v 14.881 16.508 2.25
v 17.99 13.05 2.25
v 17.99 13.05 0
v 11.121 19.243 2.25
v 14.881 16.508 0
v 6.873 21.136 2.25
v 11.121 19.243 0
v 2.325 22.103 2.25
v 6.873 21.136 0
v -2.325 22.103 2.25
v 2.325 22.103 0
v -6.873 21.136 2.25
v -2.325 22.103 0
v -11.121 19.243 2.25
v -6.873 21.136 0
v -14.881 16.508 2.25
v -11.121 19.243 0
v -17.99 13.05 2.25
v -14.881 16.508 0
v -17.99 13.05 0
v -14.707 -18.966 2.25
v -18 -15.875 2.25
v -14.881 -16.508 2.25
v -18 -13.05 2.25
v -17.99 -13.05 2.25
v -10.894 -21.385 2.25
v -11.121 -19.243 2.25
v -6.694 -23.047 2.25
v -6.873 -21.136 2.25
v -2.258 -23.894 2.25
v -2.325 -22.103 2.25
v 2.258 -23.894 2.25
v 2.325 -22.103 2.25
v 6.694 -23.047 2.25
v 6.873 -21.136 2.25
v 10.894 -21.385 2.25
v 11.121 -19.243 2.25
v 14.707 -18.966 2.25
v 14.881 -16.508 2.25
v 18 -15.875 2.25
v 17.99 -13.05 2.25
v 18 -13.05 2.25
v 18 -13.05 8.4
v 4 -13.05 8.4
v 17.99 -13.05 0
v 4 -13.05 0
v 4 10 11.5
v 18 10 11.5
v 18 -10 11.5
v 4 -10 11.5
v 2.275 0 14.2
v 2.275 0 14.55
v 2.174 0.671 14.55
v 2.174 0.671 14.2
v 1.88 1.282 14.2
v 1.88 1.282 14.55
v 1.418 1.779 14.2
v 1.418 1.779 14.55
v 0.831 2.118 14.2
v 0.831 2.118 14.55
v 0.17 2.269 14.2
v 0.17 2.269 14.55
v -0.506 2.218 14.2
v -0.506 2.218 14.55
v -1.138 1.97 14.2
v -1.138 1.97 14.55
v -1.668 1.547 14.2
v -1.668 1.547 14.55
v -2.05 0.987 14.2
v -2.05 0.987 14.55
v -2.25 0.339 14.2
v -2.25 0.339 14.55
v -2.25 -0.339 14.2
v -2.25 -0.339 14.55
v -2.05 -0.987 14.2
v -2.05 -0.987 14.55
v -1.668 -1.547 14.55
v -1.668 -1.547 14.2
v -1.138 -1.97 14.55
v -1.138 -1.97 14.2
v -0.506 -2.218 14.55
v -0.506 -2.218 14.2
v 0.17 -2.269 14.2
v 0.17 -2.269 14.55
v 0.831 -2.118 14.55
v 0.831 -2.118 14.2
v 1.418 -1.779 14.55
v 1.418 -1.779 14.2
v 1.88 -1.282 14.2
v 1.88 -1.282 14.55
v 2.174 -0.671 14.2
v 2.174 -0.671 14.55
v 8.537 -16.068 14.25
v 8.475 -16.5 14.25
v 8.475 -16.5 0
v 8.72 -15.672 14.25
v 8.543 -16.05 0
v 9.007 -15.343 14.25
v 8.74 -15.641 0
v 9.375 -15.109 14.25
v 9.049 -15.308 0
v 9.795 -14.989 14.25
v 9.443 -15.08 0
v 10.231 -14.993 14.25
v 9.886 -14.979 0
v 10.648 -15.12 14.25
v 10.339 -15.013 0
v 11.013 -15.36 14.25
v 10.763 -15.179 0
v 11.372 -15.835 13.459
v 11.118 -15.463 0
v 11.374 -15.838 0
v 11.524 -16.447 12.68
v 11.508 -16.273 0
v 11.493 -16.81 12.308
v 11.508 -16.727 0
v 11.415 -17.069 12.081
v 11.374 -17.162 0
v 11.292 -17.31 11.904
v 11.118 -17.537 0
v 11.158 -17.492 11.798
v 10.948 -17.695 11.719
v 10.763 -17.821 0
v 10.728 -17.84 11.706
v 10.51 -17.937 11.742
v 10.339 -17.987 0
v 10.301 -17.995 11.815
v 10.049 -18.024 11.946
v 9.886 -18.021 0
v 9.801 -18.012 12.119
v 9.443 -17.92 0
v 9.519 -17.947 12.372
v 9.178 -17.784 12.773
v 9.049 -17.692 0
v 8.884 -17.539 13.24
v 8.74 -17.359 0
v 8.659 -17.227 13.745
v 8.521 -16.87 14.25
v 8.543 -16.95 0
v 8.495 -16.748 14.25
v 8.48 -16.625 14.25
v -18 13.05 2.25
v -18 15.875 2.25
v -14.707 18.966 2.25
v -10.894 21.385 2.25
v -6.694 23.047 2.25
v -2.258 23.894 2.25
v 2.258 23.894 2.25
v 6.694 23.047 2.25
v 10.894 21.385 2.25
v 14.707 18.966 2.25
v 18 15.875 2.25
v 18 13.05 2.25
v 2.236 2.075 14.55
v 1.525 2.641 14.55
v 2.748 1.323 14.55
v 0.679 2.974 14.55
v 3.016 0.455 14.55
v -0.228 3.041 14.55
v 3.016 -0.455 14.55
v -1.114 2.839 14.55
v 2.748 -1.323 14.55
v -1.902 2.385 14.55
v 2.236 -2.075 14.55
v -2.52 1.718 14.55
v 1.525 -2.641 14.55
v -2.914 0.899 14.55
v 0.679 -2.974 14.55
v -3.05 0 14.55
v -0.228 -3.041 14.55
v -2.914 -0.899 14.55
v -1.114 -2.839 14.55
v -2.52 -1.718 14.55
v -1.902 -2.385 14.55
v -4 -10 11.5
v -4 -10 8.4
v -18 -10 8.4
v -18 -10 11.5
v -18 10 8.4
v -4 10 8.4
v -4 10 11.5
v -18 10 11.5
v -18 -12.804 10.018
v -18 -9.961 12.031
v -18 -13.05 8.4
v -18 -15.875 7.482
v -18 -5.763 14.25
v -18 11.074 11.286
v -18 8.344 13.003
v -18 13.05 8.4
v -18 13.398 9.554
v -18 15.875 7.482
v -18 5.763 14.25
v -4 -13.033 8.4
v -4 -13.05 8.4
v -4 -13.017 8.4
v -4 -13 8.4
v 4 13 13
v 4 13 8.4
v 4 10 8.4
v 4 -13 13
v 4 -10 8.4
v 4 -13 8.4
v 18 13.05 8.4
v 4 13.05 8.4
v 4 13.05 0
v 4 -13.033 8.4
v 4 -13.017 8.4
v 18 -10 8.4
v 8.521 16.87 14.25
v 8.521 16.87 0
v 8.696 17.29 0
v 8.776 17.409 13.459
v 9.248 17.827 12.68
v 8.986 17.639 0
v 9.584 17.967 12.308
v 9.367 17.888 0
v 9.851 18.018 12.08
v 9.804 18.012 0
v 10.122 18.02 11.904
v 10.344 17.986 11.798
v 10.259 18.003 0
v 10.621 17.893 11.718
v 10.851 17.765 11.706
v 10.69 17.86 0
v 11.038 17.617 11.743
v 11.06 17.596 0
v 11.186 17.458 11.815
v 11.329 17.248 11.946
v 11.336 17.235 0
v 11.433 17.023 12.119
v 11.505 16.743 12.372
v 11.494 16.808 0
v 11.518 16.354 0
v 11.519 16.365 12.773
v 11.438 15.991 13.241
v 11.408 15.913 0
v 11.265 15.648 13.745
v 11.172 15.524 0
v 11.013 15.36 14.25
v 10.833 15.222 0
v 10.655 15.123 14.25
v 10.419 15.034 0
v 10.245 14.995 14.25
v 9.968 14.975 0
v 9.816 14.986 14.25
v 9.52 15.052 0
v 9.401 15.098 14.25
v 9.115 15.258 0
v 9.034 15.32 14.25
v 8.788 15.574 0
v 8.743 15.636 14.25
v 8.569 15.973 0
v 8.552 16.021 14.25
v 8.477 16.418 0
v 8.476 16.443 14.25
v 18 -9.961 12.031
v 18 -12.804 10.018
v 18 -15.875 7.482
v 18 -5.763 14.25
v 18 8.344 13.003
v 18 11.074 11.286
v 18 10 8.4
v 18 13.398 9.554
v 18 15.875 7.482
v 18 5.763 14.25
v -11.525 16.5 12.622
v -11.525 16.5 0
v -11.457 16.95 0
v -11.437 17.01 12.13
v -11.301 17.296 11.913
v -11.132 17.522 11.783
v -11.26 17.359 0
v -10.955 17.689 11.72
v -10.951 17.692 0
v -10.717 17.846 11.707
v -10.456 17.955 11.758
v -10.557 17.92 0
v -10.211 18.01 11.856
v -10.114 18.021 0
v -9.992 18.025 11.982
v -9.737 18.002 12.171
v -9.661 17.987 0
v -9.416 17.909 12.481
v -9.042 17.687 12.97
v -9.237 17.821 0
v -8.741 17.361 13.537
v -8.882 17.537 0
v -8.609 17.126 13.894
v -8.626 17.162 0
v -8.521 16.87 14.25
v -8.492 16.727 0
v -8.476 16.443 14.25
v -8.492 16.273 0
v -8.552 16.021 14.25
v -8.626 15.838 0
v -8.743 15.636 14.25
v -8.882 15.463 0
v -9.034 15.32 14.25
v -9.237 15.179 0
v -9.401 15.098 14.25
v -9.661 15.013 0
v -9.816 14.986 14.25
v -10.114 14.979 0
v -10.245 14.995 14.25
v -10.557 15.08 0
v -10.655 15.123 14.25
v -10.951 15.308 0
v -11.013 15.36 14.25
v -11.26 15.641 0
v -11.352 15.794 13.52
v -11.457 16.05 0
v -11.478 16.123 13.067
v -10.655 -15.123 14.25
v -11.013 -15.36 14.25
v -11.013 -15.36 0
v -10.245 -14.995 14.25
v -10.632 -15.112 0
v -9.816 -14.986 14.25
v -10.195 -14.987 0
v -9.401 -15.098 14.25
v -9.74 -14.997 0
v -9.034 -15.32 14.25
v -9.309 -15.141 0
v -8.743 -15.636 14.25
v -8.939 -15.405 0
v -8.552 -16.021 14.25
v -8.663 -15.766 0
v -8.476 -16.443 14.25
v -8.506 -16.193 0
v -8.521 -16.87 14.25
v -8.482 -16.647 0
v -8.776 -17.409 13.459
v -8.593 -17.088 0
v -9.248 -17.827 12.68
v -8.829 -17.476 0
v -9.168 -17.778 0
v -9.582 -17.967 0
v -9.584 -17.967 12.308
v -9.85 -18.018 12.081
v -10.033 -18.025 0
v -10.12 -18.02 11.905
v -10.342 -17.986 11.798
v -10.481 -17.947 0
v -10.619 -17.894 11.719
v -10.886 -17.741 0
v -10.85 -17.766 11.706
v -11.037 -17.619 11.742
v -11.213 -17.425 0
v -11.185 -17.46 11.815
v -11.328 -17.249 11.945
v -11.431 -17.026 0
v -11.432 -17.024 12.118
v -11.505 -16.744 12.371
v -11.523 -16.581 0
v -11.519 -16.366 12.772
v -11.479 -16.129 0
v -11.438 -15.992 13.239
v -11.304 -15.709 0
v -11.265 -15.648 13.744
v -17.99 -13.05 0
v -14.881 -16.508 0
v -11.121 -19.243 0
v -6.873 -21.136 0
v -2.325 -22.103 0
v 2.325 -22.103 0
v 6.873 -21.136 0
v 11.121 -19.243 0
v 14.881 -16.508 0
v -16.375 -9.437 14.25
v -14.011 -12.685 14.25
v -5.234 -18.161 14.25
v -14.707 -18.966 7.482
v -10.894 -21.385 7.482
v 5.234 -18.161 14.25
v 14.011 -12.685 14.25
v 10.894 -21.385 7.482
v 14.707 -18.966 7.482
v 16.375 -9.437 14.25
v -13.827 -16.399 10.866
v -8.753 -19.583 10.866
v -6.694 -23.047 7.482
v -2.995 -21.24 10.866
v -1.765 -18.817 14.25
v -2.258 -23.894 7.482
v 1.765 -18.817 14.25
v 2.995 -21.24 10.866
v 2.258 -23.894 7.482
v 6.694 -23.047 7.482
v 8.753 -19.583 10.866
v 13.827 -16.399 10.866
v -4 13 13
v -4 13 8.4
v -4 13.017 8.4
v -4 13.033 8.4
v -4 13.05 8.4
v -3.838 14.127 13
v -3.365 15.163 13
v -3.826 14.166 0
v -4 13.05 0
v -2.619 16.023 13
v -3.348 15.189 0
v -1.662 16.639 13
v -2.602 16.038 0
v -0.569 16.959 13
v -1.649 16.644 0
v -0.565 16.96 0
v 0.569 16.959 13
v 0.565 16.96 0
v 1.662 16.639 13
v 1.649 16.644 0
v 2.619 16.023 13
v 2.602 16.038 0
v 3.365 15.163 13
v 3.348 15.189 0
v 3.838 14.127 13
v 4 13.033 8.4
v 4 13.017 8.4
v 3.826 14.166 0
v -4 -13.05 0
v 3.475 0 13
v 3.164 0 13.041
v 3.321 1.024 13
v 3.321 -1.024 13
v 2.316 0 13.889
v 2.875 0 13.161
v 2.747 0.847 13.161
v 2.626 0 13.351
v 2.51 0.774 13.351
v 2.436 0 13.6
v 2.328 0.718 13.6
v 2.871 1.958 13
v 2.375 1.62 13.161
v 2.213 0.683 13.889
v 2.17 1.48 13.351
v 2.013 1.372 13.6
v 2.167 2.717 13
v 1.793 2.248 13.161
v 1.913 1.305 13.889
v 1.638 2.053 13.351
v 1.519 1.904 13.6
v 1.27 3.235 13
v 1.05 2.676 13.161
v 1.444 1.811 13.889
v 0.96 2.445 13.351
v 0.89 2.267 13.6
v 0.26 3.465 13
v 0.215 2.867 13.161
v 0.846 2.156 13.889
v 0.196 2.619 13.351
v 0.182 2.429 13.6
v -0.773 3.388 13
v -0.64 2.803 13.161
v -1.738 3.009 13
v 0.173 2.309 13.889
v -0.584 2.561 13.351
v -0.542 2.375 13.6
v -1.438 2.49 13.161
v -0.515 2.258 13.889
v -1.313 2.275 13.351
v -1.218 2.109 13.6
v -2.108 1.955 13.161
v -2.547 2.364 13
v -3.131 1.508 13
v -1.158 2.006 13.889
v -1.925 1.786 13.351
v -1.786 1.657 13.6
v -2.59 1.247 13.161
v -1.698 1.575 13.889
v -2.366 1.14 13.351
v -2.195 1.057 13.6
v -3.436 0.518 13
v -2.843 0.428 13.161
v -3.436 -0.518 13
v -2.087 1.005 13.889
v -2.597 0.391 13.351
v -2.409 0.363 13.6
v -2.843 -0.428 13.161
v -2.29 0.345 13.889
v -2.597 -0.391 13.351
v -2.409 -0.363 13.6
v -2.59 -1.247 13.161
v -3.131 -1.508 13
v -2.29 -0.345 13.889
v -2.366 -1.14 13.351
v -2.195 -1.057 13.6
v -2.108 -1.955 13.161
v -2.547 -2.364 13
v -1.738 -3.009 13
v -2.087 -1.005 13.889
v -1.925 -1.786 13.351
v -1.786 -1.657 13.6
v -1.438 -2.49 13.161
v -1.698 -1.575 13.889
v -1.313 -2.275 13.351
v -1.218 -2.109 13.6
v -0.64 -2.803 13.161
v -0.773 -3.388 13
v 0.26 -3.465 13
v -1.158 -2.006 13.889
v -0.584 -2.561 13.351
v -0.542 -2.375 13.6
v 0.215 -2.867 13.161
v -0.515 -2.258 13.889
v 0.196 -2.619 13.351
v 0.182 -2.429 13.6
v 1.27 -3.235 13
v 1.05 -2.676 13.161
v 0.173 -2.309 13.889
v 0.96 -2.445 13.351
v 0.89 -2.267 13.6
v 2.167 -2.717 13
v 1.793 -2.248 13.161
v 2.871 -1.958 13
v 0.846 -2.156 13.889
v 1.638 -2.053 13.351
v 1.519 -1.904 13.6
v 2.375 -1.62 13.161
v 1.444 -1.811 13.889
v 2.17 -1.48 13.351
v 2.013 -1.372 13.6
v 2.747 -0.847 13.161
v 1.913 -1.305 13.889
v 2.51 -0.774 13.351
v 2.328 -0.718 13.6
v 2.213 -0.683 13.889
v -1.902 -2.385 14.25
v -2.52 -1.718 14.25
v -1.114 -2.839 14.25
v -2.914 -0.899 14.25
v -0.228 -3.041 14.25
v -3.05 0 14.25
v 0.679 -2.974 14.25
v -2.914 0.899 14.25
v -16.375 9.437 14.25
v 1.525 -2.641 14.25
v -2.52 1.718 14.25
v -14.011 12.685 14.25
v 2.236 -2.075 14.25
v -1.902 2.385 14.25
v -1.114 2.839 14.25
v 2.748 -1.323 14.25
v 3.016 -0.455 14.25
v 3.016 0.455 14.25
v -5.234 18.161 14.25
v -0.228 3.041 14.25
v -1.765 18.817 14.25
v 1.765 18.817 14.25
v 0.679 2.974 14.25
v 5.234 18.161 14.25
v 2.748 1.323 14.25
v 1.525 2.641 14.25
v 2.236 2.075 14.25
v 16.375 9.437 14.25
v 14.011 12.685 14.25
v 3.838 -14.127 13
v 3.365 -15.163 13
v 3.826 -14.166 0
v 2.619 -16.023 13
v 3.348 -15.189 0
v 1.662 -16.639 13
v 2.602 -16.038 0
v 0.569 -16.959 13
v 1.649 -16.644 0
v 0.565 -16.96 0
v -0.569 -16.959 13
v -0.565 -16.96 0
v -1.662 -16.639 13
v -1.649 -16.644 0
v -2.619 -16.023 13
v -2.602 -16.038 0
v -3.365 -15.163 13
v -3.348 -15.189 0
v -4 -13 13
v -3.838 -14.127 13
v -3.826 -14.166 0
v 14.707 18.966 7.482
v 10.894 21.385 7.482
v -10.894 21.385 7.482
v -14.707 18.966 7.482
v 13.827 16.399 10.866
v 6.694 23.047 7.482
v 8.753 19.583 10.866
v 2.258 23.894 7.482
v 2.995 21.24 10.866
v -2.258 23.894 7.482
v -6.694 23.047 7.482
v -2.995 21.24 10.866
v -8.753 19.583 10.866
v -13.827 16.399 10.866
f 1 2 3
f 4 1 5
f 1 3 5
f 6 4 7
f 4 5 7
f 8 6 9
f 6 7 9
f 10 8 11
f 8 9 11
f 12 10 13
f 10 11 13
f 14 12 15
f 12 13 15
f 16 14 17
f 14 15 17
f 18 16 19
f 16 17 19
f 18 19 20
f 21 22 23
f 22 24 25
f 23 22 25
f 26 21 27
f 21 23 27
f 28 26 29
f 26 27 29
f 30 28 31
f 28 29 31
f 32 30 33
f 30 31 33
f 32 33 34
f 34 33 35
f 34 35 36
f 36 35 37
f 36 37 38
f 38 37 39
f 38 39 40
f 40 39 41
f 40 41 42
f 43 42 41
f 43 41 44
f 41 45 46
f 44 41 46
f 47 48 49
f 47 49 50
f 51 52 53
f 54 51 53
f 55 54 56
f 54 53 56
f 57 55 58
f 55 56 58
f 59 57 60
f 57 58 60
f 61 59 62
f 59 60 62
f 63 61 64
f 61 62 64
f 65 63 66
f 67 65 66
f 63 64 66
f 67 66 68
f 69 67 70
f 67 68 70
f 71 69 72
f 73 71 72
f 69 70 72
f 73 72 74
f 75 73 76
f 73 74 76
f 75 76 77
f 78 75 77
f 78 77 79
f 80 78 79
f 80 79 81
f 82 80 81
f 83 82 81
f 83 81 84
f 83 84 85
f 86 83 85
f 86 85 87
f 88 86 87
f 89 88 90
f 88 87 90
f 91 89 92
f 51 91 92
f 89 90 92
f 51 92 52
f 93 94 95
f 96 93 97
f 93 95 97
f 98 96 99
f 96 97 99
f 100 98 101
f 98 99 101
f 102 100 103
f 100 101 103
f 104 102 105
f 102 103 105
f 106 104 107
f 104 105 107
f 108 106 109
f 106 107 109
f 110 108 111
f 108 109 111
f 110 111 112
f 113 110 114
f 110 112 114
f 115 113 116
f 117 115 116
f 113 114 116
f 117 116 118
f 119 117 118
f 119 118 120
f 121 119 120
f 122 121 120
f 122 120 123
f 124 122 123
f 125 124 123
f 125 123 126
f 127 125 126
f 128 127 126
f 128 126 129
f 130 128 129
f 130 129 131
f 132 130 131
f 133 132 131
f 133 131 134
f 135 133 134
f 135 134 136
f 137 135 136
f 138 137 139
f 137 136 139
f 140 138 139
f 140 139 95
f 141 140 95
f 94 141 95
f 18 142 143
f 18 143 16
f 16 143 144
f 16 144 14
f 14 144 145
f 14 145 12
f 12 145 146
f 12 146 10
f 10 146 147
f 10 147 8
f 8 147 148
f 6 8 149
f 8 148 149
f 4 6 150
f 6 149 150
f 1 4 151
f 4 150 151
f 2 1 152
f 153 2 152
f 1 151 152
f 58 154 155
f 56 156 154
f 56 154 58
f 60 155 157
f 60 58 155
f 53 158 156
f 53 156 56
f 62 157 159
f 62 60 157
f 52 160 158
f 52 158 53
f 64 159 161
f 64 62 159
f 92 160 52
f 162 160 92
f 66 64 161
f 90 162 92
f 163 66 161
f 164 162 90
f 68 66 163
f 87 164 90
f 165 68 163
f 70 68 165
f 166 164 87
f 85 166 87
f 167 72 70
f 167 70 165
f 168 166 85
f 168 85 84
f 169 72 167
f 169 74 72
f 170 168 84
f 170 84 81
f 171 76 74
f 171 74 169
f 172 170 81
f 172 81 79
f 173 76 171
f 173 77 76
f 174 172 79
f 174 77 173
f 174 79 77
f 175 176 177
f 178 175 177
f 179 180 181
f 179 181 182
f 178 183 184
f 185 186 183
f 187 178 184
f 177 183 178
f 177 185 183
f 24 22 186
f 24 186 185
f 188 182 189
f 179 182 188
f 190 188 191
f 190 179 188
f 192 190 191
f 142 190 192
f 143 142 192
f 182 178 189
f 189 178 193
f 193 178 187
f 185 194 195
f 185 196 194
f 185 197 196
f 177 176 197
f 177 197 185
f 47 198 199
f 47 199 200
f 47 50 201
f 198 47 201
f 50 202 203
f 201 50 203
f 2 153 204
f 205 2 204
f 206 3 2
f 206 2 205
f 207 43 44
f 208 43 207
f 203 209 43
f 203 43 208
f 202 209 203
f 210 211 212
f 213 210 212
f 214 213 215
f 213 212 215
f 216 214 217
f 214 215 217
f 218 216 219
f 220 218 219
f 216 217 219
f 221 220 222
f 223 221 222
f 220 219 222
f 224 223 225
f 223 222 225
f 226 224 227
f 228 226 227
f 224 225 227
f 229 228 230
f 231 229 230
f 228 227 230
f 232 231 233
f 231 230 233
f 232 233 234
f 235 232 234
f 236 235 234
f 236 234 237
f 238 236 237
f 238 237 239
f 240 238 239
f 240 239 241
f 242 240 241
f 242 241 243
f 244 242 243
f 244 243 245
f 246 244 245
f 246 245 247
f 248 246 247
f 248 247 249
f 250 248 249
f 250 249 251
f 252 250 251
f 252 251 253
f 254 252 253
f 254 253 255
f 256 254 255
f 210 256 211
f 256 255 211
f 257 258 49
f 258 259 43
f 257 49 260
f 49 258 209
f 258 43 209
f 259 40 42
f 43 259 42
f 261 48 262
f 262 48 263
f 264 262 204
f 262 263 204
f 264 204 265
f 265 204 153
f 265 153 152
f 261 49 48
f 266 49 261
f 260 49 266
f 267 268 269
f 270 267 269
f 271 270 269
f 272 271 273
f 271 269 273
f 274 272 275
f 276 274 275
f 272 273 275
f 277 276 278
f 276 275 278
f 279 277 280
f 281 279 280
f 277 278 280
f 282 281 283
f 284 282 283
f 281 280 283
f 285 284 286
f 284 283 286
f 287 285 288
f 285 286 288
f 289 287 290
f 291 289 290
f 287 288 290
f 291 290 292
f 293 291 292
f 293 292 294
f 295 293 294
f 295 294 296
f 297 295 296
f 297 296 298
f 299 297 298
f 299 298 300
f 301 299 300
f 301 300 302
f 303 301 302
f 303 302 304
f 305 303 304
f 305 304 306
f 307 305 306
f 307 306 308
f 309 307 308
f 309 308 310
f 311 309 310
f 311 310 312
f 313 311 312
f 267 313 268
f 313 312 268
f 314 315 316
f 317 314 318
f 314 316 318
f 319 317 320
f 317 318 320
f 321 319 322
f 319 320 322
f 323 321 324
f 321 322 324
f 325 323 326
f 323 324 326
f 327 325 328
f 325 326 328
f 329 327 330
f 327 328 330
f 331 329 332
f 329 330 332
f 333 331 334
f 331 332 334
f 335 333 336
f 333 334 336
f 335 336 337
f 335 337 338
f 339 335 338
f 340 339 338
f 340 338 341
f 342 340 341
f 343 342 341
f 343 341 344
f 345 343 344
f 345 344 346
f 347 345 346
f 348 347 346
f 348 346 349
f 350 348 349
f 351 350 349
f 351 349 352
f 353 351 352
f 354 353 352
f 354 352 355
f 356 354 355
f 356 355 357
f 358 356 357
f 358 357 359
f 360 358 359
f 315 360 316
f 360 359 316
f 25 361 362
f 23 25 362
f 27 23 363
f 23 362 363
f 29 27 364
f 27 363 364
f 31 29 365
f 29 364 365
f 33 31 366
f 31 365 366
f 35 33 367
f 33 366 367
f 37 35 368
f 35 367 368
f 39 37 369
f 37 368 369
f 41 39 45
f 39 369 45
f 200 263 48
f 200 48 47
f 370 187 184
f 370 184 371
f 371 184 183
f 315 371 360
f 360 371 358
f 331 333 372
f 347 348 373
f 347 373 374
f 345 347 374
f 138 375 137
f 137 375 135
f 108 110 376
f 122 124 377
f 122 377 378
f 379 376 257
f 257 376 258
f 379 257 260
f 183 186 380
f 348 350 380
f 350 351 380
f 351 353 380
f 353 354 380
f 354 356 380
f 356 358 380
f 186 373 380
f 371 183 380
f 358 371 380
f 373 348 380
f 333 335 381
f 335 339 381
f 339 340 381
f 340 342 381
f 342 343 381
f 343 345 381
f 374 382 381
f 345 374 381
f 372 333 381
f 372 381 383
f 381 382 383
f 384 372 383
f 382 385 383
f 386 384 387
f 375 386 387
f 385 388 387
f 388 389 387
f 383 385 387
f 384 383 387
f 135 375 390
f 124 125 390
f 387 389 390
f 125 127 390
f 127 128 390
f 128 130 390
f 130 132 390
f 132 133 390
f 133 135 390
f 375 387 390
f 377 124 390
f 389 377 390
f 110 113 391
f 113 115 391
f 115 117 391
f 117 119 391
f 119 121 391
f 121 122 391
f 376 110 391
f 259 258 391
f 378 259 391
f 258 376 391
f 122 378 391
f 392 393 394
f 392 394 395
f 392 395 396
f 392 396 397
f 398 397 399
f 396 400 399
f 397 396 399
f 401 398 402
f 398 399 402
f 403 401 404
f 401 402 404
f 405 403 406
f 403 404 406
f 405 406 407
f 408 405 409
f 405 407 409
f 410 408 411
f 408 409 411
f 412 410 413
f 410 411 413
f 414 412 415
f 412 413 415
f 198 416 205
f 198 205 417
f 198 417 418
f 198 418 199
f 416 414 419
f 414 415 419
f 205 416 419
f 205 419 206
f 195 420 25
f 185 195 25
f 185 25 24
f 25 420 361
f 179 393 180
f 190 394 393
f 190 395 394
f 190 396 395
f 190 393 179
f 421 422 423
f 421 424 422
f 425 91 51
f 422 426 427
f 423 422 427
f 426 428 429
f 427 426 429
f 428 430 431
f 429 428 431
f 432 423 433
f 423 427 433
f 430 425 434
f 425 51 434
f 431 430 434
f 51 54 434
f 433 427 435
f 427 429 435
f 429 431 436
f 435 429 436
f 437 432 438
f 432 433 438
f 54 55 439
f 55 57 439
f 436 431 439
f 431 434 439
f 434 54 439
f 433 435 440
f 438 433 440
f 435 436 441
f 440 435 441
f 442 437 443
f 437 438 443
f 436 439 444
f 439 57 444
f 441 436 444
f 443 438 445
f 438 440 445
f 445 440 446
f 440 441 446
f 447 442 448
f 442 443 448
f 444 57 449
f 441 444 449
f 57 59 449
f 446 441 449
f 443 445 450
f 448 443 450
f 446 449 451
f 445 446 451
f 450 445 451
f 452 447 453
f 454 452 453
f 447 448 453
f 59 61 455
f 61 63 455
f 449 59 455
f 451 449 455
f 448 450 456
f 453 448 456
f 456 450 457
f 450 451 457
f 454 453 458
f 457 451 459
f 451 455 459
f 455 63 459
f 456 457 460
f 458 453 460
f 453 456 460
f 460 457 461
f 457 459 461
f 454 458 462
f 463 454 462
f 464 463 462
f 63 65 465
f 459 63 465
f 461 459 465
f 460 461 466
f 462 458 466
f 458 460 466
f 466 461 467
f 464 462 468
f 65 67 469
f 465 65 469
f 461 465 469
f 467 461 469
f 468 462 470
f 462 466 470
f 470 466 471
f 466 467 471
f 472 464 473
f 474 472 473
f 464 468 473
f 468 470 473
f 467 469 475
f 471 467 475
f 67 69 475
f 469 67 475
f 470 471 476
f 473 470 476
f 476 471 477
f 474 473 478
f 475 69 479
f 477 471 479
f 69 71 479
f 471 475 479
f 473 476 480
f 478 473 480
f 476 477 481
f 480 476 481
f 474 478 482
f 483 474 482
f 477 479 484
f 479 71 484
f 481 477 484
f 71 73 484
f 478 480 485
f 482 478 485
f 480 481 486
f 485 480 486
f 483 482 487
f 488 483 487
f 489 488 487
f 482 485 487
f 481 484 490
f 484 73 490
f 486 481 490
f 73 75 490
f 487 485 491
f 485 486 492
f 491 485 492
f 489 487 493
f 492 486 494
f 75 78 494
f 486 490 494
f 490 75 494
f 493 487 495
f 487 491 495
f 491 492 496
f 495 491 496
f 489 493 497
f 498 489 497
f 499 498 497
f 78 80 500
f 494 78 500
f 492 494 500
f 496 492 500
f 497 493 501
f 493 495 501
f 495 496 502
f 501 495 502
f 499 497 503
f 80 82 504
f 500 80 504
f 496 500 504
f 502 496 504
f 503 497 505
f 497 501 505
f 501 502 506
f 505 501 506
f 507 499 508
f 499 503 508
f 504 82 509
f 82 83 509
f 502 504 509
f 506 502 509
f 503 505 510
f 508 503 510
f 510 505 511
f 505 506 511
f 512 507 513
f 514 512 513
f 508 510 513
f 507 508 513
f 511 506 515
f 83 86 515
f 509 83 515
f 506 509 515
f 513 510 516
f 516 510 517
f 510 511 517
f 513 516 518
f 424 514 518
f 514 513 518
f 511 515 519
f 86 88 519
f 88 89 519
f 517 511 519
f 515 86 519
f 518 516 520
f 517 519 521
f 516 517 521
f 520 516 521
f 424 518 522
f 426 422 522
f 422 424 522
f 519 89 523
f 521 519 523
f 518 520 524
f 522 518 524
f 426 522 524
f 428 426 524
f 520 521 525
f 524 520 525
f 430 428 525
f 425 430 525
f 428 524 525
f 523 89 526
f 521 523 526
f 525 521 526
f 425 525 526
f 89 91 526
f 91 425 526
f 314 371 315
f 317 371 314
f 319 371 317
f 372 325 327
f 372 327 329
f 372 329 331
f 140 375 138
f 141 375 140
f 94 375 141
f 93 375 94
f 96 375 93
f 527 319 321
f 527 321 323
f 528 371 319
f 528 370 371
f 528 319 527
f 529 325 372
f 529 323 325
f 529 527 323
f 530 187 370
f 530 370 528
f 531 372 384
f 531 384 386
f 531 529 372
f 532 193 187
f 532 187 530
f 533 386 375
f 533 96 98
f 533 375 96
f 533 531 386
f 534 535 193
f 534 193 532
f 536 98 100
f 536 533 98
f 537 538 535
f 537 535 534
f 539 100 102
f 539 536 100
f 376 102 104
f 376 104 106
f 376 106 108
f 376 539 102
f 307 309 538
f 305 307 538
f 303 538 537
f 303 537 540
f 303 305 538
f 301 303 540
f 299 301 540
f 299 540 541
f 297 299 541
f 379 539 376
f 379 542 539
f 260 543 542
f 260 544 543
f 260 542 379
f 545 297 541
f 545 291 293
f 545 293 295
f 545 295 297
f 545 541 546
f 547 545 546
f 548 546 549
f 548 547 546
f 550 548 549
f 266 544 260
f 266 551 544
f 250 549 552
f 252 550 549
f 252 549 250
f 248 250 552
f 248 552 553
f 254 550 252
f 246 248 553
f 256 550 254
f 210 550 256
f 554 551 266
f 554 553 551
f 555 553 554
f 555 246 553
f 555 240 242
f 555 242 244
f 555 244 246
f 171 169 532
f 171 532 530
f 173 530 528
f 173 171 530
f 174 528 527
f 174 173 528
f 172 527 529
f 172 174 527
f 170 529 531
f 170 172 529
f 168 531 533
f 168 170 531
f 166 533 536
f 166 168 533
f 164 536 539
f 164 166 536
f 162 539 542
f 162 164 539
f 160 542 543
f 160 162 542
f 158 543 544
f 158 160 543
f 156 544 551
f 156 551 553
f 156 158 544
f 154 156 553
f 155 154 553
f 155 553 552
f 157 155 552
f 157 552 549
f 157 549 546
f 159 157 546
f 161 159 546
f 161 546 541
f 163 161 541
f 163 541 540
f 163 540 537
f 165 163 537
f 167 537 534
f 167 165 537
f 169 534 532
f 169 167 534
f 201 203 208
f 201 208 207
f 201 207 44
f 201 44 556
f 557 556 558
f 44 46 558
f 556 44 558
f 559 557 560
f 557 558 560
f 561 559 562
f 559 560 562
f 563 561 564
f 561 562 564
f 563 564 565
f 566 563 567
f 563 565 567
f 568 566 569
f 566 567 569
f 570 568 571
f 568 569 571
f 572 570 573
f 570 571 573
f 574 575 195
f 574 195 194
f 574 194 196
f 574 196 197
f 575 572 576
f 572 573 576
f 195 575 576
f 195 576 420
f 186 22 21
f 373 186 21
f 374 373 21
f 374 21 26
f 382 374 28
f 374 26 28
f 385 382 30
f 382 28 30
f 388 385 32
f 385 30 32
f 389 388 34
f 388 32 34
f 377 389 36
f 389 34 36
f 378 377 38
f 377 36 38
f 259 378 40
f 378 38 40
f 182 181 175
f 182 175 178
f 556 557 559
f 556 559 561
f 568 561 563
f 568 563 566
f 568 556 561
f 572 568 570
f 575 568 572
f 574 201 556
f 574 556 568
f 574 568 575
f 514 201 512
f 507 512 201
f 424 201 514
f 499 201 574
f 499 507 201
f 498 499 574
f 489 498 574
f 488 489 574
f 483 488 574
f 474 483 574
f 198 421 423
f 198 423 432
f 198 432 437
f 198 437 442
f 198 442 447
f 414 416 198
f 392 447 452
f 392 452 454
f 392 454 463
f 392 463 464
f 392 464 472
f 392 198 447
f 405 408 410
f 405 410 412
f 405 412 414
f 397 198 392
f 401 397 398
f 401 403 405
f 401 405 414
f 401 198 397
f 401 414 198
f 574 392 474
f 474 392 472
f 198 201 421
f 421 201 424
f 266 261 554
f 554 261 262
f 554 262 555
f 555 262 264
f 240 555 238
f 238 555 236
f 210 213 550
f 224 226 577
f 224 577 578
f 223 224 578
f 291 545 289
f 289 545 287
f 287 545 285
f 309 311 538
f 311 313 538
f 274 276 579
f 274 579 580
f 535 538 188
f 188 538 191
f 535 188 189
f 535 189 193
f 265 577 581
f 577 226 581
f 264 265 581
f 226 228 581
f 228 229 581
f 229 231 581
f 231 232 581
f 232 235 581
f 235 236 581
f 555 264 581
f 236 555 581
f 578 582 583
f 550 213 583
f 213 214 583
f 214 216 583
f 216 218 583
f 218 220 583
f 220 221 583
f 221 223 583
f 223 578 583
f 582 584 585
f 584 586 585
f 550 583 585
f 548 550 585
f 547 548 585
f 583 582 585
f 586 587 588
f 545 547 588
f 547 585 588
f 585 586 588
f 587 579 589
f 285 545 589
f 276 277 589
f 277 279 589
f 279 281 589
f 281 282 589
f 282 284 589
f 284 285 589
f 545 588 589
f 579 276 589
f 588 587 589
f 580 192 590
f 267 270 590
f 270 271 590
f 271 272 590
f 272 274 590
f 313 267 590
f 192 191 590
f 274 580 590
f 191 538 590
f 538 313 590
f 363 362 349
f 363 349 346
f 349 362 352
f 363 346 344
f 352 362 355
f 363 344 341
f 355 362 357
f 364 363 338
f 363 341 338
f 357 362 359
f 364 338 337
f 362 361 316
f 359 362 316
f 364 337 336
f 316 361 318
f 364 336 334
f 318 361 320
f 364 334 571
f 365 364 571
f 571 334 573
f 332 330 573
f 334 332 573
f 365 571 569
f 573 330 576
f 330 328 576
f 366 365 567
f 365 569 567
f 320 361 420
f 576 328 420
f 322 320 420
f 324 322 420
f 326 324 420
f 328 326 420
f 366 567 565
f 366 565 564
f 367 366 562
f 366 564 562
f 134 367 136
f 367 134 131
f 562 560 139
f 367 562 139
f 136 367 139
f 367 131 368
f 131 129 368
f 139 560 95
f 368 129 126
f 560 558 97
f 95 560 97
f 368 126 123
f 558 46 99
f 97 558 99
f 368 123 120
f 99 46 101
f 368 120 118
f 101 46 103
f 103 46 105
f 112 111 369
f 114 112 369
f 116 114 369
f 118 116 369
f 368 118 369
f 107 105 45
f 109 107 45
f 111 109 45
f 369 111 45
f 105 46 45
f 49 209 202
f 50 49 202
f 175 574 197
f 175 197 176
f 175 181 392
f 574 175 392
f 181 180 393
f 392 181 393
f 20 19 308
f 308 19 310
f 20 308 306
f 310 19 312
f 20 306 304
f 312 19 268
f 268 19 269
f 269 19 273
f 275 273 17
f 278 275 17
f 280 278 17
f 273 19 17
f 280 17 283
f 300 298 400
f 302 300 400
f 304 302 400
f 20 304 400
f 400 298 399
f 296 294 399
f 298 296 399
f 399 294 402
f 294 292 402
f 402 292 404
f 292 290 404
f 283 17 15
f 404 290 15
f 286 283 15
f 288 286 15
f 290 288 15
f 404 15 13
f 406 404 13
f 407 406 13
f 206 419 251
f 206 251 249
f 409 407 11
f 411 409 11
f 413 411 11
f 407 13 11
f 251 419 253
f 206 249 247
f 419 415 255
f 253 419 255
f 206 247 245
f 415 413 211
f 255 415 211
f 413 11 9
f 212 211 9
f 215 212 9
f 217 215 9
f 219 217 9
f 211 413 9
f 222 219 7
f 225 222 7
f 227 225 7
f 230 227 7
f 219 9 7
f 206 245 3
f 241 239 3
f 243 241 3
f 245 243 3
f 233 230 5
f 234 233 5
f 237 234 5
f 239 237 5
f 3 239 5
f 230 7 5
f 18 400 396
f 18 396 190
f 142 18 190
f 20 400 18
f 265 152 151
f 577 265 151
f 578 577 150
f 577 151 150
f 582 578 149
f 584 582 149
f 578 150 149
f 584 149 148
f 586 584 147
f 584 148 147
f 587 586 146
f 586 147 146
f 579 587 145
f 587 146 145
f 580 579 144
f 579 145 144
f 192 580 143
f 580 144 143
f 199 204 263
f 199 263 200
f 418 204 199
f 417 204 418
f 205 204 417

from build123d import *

# Parameters (mm, degrees)
EXTRUDE1_DEPTH      = 2.25
EXTRUDE2_DEPTH      = 12
CHAMFER1_SIZE       = 5.1
CHAMFER1_SIZE2      = 6.76792859
SKETCH6_W           = 60
SKETCH6_H           = 26.1
CUT_EXTRUDE1_DEPTH  = 8.4
SKETCH9_W           = 10
SKETCH9_H           = 40
CUT_EXTRUDE3_DEPTH  = 37.363978582
SKETCH10_W          = 44
SKETCH10_H          = 20
CUT_EXTRUDE4_DEPTH  = 3.1
CUT_EXTRUDE8_DEPTH  = 13
SKETCH16_R          = 1.525
CUT_EXTRUDE9_DEPTH  = 34.212384738
SKETCH17_R          = 2.275
CUT_EXTRUDE10_DEPTH = 34.212384908
EXTRUDE4_START      = 0.3
SKETCH18_R          = 3.05
SKETCH18_R_2        = 2.275
EXTRUDE4_DEPTH      = 0.3
FILLET1_R           = 1.2


with BuildPart() as part:
    # Sketch1 → Extrude1 (new body)
    with BuildSketch(Plane.XY):
        with BuildLine():
            ThreePointArc((-22.224984725, -0.026057486), (0.013028745, -22.224996181), (22.225, 0))
            ThreePointArc((22.225, 0), (-0.013028745, 22.224996181), (-22.224984725, -0.026057486))
        make_face()
    extrude(amount=EXTRUDE1_DEPTH)

    # Sketch2 → Extrude2 (add)
    with BuildSketch(Plane.XY.offset(2.25)):
        with BuildLine():
            ThreePointArc((-23.999872331, -0.078282234), (0.113586787, -23.999731208), (23.999538151, 0.148891095))
            ThreePointArc((23.999538151, 0.148891095), (-0.113586787, 23.999731208), (-23.999872331, -0.078282234))
        make_face()
    extrude(amount=EXTRUDE2_DEPTH)

    # Chamfer1
    chamfer1_edges = [part.edges().sort_by_distance(p)[0] for p in [
        (-23.999538151, -0.148891095, 14.25),
    ]]
    chamfer1_side = [part.faces().sort_by_distance(p)[0] for p in [
        (0, 0, 14.25),
    ]]
    chamfer(chamfer1_edges, length=CHAMFER1_SIZE, length2=CHAMFER1_SIZE2, reference=chamfer1_side[0])

    # Sketch6 → Cut-Extrude1 (cut)
    with BuildSketch(Plane(origin=(0, 0, 0), x_dir=(-1, 0, 0), z_dir=(0, 0, -1))):
        Rectangle(SKETCH6_W, SKETCH6_H)
    extrude(amount=-CUT_EXTRUDE1_DEPTH, mode=Mode.SUBTRACT)

    # Sketch9 → Cut-Extrude3 (cut, through all)
    with BuildSketch(Plane(origin=(0, 0, 0), x_dir=(-1, 0, 0), z_dir=(0, 0, -1))):
        with Locations((-23, 0)):
            Rectangle(SKETCH9_W, SKETCH9_H)
        with Locations((23, 0)):
            Rectangle(SKETCH9_W, SKETCH9_H)
    extrude(amount=-CUT_EXTRUDE3_DEPTH, mode=Mode.SUBTRACT)

    # Sketch10 → Cut-Extrude4 (cut)
    with BuildSketch(Plane(origin=(0, 0, 8.4), x_dir=(-1, 0, 0), z_dir=(0, 0, -1))):
        Rectangle(SKETCH10_W, SKETCH10_H)
    extrude(amount=-CUT_EXTRUDE4_DEPTH, mode=Mode.SUBTRACT)

    # Sketch15 → Cut-Extrude8 (cut)
    with BuildSketch(Plane(origin=(0, 0, 0), x_dir=(-1, 0, 0), z_dir=(0, 0, -1))):
        with BuildLine():
            Line((4, -13), (4, 13))
            ThreePointArc((4, 13), (0, 17), (-4, 13))
            Line((-4, 13), (-4, -13))
            ThreePointArc((-4, -13), (0, -17), (4, -13))
        make_face()
    extrude(amount=-CUT_EXTRUDE8_DEPTH, mode=Mode.SUBTRACT)

    # Sketch16 → Cut-Extrude9 (cut, through all)
    with BuildSketch(Plane(origin=(0, 0, 0), x_dir=(-1, 0, 0), z_dir=(0, 0, -1))):
        with Locations((-10, -16.5)):
            Circle(SKETCH16_R)
        with Locations(Location((10, -16.5, 0), (0, 0, 48.382100449))):
            Circle(SKETCH16_R)
        with Locations((10, 16.5)):
            Circle(SKETCH16_R)
        with Locations(Location((-10, 16.5, 0), (0, 0, 14.054705204))):
            Circle(SKETCH16_R)
    extrude(amount=-CUT_EXTRUDE9_DEPTH, mode=Mode.SUBTRACT)

    # Sketch17 → Cut-Extrude10 (cut, through all)
    with BuildSketch(Plane.XY.offset(14.25)):
        Circle(SKETCH17_R)
    extrude(amount=-CUT_EXTRUDE10_DEPTH, mode=Mode.SUBTRACT)

    # Sketch18 → Extrude4 (add)
    with BuildSketch(Plane.XY.offset(14.25).offset(EXTRUDE4_START)):
        with Locations(Location((0, 0, 0), (0, 0, 180))):
            Circle(SKETCH18_R)
        Circle(SKETCH18_R_2, mode=Mode.SUBTRACT)
    extrude(amount=-EXTRUDE4_DEPTH)

    # Fillet1
    fillet1_edges = [part.edges().sort_by_distance(p)[0] for p in [
        (-2.275, 0, 13),
    ]]
    fillet(fillet1_edges, radius=FILLET1_R)


solid = part.part
